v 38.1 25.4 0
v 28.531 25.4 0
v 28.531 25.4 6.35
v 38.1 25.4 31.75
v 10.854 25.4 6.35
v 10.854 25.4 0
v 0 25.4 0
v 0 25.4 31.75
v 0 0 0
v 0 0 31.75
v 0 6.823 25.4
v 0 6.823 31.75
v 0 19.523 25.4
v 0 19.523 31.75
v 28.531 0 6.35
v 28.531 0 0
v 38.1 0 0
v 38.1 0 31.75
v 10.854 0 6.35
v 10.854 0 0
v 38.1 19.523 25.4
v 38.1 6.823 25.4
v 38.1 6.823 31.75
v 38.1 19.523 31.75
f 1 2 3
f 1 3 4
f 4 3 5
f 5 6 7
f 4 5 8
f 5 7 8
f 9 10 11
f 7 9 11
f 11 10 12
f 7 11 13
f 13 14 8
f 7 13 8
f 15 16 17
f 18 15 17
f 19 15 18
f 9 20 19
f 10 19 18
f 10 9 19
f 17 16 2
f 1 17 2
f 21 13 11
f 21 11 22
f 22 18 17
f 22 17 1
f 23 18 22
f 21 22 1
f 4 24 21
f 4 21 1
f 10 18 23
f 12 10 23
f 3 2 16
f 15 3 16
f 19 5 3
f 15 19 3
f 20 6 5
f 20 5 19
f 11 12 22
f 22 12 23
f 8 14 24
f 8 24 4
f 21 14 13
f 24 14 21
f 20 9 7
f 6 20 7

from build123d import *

# Parameters (mm, degrees)
F0_W     = 25.4
F0_H     = 31.75
F1_DEPTH = 38.1
F2_W     = 38.1
F2_H     = 12.7
F3_DEPTH = 6.35
F4_W     = 17.676627
F4_H     = 25.4
F5_DEPTH = 6.35


with BuildPart() as f1:
    # F0 (on Right) → F1 (new body)
    with BuildSketch(Plane.YZ):
        with Locations((12.7, 15.875)):
            Rectangle(F0_W, F0_H)
    extrude(amount=F1_DEPTH)

    # F2 (on face) → F3 (cut)
    with BuildSketch(Plane.XY.offset(31.75)):
        with Locations((19.05, 13.172559)):
            Rectangle(F2_W, F2_H)
    extrude(amount=-F3_DEPTH, mode=Mode.SUBTRACT)

    # F4 (on face) → F5 (cut)
    with BuildSketch(Plane(origin=(0, 0, 0), x_dir=(1, 0, 0), z_dir=(0, 0, -1))):
        with Locations((19.692383, -12.7)):
            Rectangle(F4_W, F4_H)
    extrude(amount=-F5_DEPTH, mode=Mode.SUBTRACT)


solid = f1.part
